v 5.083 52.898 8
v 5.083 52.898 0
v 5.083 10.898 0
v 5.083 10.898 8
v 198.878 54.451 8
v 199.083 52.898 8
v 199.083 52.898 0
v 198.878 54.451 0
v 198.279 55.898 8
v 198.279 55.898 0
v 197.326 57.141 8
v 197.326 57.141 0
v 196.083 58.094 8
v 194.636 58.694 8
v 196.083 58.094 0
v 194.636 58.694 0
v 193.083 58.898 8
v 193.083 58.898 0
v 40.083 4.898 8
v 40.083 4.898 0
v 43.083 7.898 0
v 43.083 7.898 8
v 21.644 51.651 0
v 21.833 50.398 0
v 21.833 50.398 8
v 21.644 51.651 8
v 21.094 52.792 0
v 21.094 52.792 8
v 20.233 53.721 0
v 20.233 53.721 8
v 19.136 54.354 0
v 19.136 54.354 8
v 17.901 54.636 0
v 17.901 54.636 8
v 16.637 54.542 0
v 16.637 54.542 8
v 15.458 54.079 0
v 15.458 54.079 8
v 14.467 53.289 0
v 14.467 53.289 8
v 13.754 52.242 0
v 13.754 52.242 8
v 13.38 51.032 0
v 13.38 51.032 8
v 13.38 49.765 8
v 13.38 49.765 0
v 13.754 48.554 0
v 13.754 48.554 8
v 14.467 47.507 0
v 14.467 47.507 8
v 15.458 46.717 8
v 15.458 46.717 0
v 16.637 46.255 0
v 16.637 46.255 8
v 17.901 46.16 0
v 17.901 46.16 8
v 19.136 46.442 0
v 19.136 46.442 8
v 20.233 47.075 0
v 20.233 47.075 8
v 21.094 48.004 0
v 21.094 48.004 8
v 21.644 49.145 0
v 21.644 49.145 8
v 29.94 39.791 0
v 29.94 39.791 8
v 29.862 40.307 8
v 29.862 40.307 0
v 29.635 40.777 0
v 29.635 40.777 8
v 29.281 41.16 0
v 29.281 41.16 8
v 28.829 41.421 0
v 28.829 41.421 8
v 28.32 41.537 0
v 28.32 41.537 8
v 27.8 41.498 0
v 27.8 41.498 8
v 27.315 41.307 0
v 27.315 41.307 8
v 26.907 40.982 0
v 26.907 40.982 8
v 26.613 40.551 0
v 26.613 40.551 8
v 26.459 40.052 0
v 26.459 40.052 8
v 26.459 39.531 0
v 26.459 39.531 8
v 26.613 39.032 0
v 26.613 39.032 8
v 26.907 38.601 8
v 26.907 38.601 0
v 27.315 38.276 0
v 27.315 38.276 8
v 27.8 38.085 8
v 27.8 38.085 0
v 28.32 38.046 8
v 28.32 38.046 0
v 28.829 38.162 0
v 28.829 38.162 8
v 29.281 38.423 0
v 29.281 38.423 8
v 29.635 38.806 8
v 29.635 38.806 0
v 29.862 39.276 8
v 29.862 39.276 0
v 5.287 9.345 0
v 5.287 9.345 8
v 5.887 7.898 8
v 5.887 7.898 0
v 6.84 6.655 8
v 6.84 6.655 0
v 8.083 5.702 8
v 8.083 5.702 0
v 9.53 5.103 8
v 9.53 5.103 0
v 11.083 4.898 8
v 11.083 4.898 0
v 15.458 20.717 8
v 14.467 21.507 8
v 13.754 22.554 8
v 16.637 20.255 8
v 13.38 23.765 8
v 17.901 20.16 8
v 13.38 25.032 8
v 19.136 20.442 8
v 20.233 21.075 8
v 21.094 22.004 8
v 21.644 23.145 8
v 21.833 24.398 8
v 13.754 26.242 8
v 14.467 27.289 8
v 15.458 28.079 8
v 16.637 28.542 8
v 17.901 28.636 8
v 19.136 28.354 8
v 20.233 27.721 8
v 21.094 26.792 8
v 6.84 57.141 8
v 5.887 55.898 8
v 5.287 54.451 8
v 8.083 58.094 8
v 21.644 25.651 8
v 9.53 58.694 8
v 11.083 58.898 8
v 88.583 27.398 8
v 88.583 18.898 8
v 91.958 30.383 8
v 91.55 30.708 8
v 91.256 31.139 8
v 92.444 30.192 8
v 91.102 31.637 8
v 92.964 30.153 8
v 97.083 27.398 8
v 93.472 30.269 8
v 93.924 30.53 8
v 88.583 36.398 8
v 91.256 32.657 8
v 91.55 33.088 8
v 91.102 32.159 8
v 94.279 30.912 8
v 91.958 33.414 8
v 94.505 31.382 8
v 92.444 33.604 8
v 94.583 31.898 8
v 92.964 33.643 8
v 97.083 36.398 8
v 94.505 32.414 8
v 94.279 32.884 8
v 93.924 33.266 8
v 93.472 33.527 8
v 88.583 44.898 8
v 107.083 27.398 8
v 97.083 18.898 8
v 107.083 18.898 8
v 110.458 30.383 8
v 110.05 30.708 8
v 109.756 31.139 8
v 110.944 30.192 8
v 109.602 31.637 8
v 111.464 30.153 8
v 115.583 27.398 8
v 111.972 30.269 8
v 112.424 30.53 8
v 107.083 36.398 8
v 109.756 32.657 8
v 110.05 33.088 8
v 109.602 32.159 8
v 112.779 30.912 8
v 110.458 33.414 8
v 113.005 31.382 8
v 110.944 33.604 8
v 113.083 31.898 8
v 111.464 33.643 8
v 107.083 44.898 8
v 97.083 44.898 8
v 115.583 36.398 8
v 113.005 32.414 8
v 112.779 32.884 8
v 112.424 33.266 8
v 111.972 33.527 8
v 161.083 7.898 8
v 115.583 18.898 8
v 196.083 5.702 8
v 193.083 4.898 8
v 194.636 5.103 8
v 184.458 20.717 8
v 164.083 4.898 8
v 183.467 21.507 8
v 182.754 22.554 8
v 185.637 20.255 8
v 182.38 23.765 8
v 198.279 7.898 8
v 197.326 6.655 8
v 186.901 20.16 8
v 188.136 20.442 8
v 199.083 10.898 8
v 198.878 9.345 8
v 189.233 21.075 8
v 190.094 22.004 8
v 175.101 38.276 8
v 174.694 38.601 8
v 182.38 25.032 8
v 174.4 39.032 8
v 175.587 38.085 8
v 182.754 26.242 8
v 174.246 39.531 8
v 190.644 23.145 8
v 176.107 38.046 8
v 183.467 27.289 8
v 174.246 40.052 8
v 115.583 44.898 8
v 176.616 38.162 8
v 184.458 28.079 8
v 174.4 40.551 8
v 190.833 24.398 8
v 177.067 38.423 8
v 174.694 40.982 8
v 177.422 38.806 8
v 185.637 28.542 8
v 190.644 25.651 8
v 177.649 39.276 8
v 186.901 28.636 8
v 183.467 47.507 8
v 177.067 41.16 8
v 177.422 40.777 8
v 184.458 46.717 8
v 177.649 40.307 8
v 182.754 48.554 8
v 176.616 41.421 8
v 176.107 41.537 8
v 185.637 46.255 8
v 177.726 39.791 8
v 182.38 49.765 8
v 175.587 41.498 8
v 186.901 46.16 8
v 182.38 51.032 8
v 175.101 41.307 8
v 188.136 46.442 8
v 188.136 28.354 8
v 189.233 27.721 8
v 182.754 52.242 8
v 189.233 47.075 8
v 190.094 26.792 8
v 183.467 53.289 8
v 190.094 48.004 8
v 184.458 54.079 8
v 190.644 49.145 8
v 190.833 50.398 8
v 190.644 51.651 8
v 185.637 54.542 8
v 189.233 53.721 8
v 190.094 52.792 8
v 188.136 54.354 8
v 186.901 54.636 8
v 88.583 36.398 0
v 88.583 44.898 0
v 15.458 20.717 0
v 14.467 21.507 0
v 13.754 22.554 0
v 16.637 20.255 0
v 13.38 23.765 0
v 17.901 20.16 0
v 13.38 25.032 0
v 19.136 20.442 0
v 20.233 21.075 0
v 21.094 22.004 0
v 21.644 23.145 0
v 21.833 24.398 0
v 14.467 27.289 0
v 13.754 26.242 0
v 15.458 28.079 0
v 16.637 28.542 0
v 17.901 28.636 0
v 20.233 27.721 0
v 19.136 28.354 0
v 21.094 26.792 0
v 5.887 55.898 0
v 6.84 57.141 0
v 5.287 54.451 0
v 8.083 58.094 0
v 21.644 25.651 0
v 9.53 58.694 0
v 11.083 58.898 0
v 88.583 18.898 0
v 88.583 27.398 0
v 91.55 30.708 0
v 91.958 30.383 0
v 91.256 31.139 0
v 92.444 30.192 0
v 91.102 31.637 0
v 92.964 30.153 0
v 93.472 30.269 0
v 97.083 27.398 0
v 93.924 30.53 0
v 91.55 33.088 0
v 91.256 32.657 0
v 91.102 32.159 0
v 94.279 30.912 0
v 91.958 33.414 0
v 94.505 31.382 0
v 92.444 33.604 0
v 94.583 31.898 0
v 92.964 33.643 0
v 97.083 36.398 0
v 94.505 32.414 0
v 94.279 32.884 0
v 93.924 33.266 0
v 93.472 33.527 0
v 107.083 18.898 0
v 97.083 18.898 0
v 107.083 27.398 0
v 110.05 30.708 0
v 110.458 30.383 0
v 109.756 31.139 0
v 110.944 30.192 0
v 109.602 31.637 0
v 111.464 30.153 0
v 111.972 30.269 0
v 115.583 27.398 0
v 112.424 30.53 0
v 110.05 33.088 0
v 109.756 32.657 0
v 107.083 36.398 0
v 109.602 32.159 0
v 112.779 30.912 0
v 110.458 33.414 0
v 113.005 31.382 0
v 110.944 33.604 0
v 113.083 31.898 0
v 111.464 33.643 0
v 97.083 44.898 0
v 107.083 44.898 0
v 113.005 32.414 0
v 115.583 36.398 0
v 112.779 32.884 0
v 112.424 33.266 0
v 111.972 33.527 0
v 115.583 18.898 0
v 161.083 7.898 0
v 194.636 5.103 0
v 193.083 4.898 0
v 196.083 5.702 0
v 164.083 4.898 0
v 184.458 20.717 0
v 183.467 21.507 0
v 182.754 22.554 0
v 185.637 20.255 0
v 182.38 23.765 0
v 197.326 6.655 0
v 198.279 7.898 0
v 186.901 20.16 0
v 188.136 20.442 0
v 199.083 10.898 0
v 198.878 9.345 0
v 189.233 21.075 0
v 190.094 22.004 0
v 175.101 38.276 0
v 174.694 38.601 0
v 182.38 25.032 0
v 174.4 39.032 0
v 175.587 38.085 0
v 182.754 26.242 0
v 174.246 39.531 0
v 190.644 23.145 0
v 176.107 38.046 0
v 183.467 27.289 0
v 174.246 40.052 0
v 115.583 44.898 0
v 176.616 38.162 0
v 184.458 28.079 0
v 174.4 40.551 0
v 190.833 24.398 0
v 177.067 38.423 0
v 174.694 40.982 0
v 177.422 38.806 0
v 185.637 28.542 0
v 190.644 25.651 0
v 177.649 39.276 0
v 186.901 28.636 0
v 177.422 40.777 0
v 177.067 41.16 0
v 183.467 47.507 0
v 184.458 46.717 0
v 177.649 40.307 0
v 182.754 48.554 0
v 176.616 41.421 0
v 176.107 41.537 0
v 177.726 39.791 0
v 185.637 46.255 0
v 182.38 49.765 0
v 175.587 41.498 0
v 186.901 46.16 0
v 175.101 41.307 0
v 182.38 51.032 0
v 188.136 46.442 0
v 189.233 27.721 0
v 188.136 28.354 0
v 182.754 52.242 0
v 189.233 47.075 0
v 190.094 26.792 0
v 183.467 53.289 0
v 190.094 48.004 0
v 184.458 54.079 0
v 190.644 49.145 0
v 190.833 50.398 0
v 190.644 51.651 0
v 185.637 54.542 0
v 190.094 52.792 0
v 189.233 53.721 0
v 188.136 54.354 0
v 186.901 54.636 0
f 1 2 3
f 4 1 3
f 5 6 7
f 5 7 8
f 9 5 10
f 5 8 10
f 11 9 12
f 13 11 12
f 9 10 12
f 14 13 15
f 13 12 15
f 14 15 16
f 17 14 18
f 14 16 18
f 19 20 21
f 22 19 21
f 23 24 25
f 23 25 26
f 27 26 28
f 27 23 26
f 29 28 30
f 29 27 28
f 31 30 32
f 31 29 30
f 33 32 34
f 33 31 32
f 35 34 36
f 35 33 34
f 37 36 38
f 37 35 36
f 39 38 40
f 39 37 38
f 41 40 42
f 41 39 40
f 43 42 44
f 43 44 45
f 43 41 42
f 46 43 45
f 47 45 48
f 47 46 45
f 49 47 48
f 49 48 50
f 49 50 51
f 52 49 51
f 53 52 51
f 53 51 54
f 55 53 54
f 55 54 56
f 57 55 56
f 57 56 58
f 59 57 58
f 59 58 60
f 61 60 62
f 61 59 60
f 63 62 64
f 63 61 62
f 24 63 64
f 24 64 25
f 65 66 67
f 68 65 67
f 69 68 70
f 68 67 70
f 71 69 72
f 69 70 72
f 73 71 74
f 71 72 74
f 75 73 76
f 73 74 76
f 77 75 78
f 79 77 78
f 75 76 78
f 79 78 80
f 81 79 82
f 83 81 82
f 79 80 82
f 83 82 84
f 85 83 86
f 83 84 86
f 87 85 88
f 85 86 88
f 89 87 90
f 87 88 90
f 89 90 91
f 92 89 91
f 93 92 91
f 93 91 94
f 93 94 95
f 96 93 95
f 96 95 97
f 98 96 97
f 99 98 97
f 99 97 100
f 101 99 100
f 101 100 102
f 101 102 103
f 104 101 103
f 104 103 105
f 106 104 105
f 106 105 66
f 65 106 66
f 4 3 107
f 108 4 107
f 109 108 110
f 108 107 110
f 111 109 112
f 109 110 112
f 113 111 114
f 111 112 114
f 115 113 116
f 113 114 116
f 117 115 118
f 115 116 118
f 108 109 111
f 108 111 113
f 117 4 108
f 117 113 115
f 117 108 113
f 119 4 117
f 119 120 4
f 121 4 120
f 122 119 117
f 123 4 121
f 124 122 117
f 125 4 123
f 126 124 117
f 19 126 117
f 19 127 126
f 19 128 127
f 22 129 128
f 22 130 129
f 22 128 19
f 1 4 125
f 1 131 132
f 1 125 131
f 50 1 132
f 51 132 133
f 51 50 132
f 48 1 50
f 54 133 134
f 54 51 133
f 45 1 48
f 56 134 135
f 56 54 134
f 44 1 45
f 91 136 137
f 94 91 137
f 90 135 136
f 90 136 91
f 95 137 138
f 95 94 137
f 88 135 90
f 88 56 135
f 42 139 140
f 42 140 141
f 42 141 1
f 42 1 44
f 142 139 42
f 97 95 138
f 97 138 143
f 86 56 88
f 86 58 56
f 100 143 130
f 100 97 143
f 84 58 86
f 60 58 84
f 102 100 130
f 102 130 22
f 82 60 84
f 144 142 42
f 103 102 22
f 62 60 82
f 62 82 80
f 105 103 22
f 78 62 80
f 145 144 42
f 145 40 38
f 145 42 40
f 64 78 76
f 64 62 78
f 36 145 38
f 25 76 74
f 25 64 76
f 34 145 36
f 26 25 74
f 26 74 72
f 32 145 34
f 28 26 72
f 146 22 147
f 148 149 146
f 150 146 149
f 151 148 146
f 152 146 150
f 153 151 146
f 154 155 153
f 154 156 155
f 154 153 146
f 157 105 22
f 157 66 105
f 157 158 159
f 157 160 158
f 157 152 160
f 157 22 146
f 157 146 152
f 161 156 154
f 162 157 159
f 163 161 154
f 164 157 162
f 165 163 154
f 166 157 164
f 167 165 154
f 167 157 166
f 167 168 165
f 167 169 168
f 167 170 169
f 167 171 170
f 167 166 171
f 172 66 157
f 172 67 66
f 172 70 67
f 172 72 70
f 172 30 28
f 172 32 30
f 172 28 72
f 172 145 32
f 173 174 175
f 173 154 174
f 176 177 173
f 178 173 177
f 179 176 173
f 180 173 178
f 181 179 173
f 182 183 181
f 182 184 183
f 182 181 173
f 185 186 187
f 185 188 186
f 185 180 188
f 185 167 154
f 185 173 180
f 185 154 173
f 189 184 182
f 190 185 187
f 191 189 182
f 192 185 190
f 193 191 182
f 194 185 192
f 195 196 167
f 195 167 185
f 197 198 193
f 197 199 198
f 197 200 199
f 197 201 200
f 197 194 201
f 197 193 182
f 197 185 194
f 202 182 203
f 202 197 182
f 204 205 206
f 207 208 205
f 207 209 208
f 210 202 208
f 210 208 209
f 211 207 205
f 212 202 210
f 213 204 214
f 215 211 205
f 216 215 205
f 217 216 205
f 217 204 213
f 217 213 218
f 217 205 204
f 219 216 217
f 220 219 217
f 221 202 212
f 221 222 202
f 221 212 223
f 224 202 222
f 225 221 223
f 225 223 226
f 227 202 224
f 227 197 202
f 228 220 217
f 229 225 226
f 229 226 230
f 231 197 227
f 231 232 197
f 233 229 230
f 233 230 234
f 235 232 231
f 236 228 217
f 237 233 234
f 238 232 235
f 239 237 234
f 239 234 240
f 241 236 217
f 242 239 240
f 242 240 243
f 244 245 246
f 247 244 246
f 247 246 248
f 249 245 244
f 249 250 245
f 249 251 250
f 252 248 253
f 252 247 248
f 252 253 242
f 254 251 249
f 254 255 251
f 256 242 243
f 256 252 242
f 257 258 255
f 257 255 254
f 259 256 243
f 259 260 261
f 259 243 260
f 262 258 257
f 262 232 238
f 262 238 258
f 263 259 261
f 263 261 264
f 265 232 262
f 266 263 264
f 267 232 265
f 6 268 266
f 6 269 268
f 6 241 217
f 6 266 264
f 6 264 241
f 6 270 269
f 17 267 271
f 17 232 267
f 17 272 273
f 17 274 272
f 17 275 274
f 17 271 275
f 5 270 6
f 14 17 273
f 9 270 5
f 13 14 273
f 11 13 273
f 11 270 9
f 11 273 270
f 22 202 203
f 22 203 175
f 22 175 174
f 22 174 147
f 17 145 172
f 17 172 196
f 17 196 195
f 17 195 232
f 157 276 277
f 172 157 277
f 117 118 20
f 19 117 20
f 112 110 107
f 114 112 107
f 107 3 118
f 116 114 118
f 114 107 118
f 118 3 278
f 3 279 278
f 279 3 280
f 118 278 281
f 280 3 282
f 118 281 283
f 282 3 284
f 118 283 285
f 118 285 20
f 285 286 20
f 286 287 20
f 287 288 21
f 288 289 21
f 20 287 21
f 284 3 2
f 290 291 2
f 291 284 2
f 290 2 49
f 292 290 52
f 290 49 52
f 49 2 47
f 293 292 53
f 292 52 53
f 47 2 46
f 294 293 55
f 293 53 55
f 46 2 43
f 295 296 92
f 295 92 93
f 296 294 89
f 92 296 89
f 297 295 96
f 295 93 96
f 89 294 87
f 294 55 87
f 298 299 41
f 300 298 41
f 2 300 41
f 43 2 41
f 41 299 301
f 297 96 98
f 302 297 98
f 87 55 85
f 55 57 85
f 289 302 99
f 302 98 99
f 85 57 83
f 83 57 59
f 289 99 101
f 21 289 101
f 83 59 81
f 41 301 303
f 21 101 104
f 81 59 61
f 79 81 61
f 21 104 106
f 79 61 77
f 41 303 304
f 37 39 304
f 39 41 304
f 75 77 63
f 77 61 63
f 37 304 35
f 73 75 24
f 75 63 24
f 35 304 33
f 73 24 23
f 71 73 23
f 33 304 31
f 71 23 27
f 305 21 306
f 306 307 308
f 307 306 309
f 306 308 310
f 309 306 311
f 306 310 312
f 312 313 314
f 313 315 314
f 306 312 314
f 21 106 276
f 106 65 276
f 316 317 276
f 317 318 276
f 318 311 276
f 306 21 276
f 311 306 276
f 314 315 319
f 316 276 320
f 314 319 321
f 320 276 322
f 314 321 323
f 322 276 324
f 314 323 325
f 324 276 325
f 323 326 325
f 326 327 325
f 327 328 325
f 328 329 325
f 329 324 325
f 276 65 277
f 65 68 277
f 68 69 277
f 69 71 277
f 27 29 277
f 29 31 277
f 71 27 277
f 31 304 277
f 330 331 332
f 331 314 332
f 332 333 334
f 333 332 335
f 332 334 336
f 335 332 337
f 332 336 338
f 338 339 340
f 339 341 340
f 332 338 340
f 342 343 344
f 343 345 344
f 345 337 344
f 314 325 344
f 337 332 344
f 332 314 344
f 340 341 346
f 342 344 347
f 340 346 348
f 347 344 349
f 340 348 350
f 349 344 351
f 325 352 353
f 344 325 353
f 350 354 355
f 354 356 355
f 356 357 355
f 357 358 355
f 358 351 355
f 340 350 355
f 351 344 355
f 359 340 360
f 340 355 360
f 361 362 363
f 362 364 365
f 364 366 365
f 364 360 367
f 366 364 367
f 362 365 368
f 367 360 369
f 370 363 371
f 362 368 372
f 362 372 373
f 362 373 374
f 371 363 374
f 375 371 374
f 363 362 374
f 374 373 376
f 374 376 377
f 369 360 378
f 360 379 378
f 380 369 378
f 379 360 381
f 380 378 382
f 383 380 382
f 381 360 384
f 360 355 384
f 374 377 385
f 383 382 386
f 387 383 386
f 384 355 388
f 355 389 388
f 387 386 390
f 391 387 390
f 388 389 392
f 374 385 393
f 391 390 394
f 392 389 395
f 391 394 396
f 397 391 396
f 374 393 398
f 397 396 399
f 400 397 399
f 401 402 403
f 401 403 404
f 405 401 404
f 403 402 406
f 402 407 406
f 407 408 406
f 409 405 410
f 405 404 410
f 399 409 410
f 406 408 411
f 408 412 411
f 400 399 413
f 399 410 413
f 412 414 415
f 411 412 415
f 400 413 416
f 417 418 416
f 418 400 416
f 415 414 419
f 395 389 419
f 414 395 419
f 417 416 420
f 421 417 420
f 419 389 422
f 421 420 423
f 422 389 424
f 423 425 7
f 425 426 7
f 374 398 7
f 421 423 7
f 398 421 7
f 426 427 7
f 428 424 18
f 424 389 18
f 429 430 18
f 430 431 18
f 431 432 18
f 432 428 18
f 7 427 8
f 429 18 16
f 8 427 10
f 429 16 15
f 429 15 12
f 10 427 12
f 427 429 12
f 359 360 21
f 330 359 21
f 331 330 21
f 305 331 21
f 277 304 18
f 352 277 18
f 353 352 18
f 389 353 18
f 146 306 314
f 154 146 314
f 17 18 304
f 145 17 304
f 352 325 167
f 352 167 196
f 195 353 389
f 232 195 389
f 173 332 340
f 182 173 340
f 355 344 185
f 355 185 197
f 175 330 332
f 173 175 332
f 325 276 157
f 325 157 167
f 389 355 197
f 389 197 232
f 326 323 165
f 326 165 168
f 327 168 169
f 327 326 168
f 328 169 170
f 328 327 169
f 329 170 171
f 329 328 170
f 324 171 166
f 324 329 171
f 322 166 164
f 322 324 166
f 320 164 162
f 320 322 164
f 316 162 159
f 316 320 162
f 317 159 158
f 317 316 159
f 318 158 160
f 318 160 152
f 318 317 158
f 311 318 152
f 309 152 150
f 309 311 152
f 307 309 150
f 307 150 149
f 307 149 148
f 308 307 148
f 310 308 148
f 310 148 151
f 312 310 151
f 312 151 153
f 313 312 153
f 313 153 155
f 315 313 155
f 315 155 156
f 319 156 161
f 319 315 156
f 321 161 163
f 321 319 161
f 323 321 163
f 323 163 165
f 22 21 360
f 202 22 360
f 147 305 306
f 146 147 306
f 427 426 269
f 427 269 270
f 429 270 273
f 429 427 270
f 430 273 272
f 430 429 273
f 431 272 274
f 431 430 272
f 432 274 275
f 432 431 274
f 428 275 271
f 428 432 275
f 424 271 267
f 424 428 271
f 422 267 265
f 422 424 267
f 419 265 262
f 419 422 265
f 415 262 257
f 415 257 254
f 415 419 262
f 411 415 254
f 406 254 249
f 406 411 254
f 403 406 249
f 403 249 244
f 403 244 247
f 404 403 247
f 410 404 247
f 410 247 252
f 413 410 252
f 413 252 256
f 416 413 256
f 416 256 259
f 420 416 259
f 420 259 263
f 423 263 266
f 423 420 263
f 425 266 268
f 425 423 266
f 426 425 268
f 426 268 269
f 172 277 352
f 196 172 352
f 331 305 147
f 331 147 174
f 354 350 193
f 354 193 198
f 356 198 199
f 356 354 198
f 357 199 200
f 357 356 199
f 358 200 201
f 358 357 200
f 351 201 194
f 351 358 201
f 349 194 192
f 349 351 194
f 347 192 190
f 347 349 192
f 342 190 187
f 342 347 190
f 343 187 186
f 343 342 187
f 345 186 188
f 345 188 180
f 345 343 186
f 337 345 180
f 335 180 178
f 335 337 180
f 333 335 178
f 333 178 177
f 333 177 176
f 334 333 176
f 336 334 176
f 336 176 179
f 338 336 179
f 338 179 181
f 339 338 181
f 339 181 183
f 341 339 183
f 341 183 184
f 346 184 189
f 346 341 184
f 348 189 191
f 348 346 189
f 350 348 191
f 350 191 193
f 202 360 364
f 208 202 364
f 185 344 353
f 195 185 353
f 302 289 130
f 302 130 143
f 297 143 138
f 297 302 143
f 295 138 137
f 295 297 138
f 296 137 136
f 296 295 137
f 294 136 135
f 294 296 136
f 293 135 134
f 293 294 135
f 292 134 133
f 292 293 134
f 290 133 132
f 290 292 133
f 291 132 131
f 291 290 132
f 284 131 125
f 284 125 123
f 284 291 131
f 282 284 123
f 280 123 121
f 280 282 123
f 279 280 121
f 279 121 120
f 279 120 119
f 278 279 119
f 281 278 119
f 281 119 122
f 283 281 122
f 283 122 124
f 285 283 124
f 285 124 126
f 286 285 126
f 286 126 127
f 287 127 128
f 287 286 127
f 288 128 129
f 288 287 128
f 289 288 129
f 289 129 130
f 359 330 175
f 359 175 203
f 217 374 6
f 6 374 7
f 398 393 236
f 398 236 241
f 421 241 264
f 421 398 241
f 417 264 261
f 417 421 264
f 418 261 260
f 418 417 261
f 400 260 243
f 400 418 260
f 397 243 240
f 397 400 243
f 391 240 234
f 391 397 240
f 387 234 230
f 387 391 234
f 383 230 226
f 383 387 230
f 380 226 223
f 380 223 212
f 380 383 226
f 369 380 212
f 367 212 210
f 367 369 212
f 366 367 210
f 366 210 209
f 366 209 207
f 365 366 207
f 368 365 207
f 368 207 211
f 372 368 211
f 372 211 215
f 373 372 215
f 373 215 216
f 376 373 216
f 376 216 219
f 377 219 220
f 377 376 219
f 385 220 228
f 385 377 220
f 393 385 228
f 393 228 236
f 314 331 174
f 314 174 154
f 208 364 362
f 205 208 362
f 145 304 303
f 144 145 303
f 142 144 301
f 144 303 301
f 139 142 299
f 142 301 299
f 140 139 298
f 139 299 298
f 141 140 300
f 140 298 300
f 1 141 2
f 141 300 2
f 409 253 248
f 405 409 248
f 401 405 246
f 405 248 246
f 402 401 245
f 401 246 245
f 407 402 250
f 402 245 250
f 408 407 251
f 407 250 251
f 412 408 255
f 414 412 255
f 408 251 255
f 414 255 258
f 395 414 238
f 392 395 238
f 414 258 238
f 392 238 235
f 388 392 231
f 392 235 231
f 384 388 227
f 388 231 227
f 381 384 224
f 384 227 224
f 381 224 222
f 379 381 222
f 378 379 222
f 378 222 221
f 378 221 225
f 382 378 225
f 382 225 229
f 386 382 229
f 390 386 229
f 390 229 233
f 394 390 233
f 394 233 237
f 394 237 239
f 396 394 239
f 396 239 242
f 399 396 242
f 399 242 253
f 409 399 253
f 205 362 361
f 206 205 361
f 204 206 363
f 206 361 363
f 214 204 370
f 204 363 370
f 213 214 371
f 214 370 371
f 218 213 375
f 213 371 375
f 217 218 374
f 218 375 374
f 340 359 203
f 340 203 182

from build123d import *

# Parameters (mm, degrees)
SKETCH1_R      = 4.25
SKETCH1_R_2    = 1.75
SKETCH1_W      = 8.5
SKETCH1_H      = 8.5
EXTRUDE1_DEPTH = 8
SKETCH2_R      = 1.75
EXTRUDE2_DEPTH = 10


with BuildPart() as part:
    # Sketch1 → Extrude1 (new body)
    with BuildSketch(Plane.XY):
        with BuildLine():
            Line((5.082943524, 52.898094917), (5.082943524, 10.898094917))
            ThreePointArc((5.082943524, 10.898094917), (6.840302837, 6.65545423), (11.082943524, 4.898094917))
            Line((11.082943524, 4.898094917), (40.082943524, 4.898094917))
            Line((40.082943524, 4.898094917), (43.082943524, 7.898094917))
            Line((43.082943524, 7.898094917), (161.082943524, 7.898094917))
            Line((161.082943524, 7.898094917), (164.082943524, 4.898094917))
            Line((164.082943524, 4.898094917), (193.082943524, 4.898094917))
            ThreePointArc((193.082943524, 4.898094917), (197.325584211, 6.65545423), (199.082943524, 10.898094917))
            Line((199.082943524, 10.898094917), (199.082943524, 52.898094917))
            ThreePointArc((199.082943524, 52.898094917), (197.325584211, 57.140735604), (193.082943524, 58.898094917))
            Line((193.082943524, 58.898094917), (11.082943524, 58.898094917))
            ThreePointArc((11.082943524, 58.898094917), (6.840302837, 57.140735604), (5.082943524, 52.898094917))
        make_face()
        with Locations((186.582943524, 50.398094917)):
            Circle(SKETCH1_R, mode=Mode.SUBTRACT)
        with Locations((186.582943524, 24.398094917)):
            Circle(SKETCH1_R, mode=Mode.SUBTRACT)
        with Locations((17.582943524, 50.398094917)):
            Circle(SKETCH1_R, mode=Mode.SUBTRACT)
        with Locations((17.582943524, 24.398094917)):
            Circle(SKETCH1_R, mode=Mode.SUBTRACT)
        with Locations((92.832943524, 31.898094917)):
            Circle(SKETCH1_R_2, mode=Mode.SUBTRACT)
        with Locations((111.332943524, 31.898094917)):
            Circle(SKETCH1_R_2, mode=Mode.SUBTRACT)
        with Locations((92.832943524, 40.648094917)):
            Rectangle(SKETCH1_W, SKETCH1_H, mode=Mode.SUBTRACT)
        with Locations((111.332943524, 40.648094917)):
            Rectangle(SKETCH1_W, SKETCH1_H, mode=Mode.SUBTRACT)
        with Locations((92.832943524, 23.148094917)):
            Rectangle(SKETCH1_W, SKETCH1_H, mode=Mode.SUBTRACT)
        with Locations((111.332943524, 23.148094917)):
            Rectangle(SKETCH1_W, SKETCH1_H, mode=Mode.SUBTRACT)
    extrude(amount=EXTRUDE1_DEPTH)

    # Sketch2 → Extrude2 (cut)
    with BuildSketch(Plane.XY.offset(8)):
        with Locations((28.189545242, 39.791493199)):
            Circle(SKETCH2_R)
        with Locations((175.976341806, 39.791493199)):
            Circle(SKETCH2_R)
    extrude(amount=-EXTRUDE2_DEPTH, mode=Mode.SUBTRACT)


solid = part.part
